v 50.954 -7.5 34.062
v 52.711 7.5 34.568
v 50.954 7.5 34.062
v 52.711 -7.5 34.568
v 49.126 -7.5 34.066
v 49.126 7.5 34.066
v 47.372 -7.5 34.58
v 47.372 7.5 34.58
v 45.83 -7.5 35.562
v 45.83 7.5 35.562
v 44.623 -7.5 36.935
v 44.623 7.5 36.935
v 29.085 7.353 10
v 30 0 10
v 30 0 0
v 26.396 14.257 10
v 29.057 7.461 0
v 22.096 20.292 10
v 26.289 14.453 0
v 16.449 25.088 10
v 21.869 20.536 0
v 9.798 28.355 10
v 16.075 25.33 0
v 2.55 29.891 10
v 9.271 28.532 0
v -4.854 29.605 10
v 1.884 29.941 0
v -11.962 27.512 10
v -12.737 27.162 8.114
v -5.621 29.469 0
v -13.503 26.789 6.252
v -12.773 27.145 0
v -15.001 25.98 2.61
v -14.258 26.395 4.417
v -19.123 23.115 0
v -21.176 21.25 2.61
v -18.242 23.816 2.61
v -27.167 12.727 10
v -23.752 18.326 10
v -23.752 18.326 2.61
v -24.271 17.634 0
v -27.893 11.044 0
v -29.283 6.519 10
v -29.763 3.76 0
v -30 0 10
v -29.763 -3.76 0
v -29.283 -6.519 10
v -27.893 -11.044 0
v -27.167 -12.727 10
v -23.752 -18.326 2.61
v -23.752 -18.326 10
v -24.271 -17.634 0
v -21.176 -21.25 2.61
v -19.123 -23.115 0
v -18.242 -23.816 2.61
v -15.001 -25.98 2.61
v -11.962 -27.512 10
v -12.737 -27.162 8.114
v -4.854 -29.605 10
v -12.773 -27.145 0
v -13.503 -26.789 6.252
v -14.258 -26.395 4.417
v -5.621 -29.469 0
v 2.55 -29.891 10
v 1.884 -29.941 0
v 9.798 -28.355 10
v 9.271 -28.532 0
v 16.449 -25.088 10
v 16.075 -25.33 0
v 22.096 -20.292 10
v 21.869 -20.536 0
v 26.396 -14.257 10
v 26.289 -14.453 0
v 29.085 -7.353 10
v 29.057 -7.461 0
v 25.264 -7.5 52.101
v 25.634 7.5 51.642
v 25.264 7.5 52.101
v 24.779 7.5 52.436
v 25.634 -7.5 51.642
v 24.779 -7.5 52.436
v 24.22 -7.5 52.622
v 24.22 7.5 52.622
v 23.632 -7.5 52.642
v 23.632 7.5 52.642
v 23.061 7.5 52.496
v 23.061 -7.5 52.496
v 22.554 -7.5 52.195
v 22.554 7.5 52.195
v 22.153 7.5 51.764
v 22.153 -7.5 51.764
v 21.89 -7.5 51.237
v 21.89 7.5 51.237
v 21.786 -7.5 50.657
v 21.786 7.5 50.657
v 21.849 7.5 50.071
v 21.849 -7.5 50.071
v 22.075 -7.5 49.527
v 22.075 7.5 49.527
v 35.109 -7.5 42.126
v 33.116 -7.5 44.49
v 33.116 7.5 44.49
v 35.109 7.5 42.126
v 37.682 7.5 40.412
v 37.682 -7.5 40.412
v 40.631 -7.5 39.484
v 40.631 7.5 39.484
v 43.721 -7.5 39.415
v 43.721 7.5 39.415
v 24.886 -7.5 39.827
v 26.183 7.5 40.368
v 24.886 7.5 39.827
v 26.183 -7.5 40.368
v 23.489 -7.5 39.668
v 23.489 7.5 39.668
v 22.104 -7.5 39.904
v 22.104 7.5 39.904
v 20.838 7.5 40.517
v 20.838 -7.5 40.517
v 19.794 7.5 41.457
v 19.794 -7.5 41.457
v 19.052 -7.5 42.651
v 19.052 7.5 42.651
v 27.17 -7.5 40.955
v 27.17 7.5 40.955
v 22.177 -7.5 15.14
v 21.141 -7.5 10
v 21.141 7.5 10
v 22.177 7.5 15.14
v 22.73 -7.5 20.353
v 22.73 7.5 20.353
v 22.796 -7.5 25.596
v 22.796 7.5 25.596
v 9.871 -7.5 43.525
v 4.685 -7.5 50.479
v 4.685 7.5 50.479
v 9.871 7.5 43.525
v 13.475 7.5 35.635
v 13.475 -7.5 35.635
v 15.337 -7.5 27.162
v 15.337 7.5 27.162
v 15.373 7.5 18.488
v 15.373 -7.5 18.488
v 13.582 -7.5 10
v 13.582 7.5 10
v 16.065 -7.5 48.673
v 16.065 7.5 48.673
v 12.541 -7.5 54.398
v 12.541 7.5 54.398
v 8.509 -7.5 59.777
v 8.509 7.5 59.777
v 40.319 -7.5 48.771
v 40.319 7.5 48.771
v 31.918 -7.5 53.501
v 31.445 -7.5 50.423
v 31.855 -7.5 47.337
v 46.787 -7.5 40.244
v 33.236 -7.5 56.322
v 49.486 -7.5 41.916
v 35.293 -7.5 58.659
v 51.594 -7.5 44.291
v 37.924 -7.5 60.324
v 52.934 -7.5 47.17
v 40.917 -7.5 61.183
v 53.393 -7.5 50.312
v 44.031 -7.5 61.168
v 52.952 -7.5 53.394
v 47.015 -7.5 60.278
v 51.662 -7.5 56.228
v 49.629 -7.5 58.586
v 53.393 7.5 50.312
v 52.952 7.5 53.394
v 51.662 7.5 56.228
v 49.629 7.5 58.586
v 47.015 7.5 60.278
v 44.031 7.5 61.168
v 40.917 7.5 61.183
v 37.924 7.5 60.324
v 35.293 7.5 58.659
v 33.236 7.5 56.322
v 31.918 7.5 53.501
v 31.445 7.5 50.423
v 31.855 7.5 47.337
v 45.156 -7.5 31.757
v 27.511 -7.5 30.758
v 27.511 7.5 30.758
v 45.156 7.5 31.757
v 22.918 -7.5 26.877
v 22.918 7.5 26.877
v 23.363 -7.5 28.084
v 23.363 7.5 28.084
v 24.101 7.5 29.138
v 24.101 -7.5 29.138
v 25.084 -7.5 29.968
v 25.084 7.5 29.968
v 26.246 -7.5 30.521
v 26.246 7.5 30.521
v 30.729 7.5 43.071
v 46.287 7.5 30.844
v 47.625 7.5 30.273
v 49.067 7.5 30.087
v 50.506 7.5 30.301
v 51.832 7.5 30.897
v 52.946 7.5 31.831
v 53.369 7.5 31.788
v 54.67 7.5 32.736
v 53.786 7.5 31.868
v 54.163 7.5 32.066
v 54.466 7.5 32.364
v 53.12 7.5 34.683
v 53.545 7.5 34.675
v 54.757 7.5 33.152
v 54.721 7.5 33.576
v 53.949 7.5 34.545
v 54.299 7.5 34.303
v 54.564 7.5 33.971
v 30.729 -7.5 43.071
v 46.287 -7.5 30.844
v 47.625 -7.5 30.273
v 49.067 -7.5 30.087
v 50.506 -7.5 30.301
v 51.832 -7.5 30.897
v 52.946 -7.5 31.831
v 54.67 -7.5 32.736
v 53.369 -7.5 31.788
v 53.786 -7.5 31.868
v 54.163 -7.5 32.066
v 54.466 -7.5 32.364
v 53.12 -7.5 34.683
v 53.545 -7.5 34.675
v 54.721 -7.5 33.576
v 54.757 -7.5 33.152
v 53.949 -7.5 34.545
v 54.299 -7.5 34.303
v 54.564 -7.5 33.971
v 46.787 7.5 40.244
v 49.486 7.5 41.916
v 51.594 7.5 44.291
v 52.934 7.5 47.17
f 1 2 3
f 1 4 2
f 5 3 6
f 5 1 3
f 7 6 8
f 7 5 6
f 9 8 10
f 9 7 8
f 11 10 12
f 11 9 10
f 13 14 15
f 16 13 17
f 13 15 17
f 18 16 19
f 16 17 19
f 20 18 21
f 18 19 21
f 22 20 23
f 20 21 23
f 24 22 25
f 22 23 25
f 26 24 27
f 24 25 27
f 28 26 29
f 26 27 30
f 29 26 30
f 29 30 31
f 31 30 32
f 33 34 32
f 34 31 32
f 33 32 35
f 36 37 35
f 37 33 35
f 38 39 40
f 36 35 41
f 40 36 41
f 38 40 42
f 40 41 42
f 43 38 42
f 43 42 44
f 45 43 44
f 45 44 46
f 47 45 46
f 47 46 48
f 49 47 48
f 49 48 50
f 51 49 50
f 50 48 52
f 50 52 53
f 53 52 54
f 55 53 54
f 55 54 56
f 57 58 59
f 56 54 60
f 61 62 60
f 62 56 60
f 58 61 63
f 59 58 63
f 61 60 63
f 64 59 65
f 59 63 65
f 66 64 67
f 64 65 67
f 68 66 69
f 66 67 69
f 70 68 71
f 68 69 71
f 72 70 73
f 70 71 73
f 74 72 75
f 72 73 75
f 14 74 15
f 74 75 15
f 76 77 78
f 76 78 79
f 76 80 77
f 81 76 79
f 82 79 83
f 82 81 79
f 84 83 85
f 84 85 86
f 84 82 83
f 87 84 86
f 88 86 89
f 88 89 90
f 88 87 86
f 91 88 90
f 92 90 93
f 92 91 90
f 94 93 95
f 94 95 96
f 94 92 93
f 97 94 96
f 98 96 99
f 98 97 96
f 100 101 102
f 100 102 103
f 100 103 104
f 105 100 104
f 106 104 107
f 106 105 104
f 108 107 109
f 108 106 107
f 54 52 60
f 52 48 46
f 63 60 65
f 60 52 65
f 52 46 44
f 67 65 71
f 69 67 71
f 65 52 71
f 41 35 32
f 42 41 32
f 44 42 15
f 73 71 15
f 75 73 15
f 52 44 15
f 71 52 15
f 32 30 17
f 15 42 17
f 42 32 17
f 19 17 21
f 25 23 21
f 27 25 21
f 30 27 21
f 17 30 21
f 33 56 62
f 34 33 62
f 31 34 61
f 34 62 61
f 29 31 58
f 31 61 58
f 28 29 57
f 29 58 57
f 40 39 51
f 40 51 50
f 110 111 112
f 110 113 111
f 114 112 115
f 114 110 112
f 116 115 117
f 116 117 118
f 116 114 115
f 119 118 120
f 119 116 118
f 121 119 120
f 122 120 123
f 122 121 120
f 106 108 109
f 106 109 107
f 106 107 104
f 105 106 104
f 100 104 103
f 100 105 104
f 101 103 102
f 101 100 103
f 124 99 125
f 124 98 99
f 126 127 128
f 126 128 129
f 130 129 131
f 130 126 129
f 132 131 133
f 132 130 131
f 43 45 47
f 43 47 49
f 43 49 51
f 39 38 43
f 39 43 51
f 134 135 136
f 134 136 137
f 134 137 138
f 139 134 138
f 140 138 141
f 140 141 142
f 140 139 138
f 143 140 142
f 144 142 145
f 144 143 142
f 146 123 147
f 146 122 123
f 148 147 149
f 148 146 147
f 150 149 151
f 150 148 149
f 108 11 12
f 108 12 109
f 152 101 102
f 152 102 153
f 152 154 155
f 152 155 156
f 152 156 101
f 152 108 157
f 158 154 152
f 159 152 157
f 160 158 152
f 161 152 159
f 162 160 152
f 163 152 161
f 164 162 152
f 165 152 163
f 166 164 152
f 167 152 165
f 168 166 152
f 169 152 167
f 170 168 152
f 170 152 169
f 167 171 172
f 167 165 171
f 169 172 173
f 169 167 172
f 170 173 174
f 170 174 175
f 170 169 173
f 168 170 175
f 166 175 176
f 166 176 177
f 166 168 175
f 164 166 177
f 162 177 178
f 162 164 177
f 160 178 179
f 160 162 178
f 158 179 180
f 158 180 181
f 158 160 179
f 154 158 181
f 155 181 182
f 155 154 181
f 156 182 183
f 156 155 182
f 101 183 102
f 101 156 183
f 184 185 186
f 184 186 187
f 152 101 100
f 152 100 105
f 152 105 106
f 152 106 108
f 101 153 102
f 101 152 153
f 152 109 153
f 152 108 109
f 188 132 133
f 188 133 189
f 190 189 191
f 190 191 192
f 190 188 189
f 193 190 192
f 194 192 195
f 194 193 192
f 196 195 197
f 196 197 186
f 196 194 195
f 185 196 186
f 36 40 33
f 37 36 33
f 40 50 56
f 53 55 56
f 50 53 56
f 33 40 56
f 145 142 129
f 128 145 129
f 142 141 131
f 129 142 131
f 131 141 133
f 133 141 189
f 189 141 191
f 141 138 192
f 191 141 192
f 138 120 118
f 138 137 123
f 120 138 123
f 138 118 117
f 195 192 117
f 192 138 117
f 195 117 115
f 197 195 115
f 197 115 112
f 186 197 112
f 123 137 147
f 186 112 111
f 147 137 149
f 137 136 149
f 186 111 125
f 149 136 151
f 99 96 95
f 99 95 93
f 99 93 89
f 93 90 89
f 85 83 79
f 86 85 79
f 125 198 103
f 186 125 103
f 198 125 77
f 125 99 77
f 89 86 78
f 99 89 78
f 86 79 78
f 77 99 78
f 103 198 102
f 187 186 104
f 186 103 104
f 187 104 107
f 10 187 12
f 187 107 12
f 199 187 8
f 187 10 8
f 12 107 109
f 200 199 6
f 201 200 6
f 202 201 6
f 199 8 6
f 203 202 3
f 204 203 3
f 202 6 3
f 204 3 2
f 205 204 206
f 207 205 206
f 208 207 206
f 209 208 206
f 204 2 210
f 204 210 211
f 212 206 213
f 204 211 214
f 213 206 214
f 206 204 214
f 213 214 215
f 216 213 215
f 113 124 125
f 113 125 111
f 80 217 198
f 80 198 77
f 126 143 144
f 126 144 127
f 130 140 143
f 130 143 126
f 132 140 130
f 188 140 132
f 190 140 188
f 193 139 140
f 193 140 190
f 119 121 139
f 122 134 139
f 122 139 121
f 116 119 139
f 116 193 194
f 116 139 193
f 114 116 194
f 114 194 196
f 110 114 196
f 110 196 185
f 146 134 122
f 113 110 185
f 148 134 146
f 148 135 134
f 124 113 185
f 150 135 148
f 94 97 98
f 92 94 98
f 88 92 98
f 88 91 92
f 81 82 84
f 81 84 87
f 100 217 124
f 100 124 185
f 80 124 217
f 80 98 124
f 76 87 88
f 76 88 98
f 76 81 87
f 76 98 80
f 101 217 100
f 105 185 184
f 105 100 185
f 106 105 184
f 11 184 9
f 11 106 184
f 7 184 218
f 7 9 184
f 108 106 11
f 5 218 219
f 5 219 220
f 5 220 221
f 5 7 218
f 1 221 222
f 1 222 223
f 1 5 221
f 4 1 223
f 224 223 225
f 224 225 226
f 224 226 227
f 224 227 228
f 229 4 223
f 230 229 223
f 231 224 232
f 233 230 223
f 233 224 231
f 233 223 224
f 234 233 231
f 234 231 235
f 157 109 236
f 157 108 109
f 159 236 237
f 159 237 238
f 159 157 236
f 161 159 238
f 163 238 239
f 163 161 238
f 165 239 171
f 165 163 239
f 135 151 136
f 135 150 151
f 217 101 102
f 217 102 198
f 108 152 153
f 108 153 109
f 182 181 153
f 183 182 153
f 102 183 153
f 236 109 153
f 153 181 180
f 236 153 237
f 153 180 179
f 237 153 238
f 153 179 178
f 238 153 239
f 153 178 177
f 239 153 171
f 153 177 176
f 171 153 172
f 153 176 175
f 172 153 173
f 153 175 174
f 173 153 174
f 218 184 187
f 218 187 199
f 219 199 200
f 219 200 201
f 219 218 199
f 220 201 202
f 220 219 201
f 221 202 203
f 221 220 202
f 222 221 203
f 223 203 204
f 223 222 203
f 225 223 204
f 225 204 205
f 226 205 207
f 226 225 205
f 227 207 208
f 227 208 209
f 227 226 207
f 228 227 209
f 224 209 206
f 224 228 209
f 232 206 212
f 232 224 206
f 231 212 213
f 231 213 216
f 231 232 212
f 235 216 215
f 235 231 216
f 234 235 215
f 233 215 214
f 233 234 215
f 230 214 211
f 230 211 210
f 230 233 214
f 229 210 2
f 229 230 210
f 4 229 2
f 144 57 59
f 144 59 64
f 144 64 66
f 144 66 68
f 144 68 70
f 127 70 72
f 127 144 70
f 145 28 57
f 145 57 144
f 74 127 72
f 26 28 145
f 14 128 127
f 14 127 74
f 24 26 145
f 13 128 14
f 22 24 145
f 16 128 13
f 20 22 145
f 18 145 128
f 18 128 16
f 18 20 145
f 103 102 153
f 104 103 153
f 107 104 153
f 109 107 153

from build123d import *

# Parameters (mm, degrees)
F0_R      = 30
F1_DEPTH  = 10
F3_DEPTH  = 36.6
F4_DEPTH  = 7.5
F5_DEPTH  = 7.5
F6_DEPTH  = 7.5
F7_DEPTH  = 7.5
F8_DEPTH  = 7.5
F9_DEPTH  = 7.5
F10_DEPTH = 7.5


with BuildPart() as f1:
    # F0 (on Top) → F1 (new body)
    with BuildSketch(Plane.XY):
        Circle(F0_R)
    extrude(amount=F1_DEPTH)

    # F2 (on Front) → F3 (cut, symmetric)
    with BuildSketch(Plane.XZ):
        Polygon((-23.752017, 2.609918), (-15.000855, 2.609918), (-11.70979, 10.612488), (-23.752017, 10.612488), align=None)
    extrude(amount=F3_DEPTH, both=True, mode=Mode.SUBTRACT)

    # F2 (on Front) → F4 (join, symmetric)
    with BuildSketch(Plane.XZ):
        with BuildLine():
            Line((8.509134, 59.776919), (4.685482, 50.479309))
            ThreePointArc((4.685482, 50.479309), (14.632215, 31.443401), (13.578704, 9.991281))
            Line((13.578704, 9.991281), (21.138772, 9.991281))
            ThreePointArc((21.138772, 9.991281), (22.513844, 17.735509), (22.796076, 25.595804))
            ThreePointArc((22.796076, 25.595804), (24.101227, 29.137781), (27.510648, 30.757927))
            Line((27.510648, 30.757927), (45.155515, 31.756574))
            Line((45.155515, 31.756574), (46.479001, 31.831479))
            Line((46.479001, 31.831479), (44.623066, 36.935325))
            Line((44.623066, 36.935325), (43.721419, 39.414866))
            ThreePointArc((43.721419, 39.414866), (37.681727, 40.412232), (33.11581, 44.489611))
            Line((33.11581, 44.489611), (30.728899, 43.070735))
            Line((30.728899, 43.070735), (27.170425, 40.955436))
            Line((27.170425, 40.955436), (26.182877, 40.368398))
            ThreePointArc((26.182877, 40.368398), (22.103598, 39.904413), (19.052114, 42.651091))
            ThreePointArc((19.052114, 42.651091), (14.36798, 51.575592), (8.509134, 59.776919))
        make_face()
    extrude(amount=F4_DEPTH, both=True)

    # F2 (on Front) → F7 (join, symmetric)
    with BuildSketch(Plane.XZ):
        Polygon((22.075249, 49.526824), (27.170425, 40.955436), (30.728899, 43.070735), (25.633722, 51.642123), align=None)
    extrude(amount=F7_DEPTH, both=True)

    # F2 (on Front) → F8 (join, symmetric)
    with BuildSketch(Plane.XZ):
        with BuildLine():
            ThreePointArc((25.633722, 51.642123), (22.796836, 52.36371), (22.075249, 49.526824))
            Line((22.075249, 49.526824), (25.633722, 51.642123))
        make_face()
    extrude(amount=F8_DEPTH, both=True)

    # F2 (on Front) → F9 (join, symmetric)
    with BuildSketch(Plane.XZ):
        with BuildLine():
            Line((46.479001, 31.831479), (45.155515, 31.756574))
            ThreePointArc((45.155515, 31.756574), (49.067291, 30.087217), (52.946247, 31.831479))
            Line((52.946247, 31.831479), (52.710793, 34.568003))
            ThreePointArc((52.710793, 34.568003), (48.230587, 34.260941), (44.623066, 36.935325))
            Line((44.623066, 36.935325), (46.479001, 31.831479))
        make_face()
    extrude(amount=F9_DEPTH, both=True)

    # F2 (on Front) → F10 (join, symmetric)
    with BuildSketch(Plane.XZ):
        with BuildLine():
            Line((52.710793, 34.568003), (52.946247, 31.831479))
            ThreePointArc((52.946247, 31.831479), (54.754823, 33.365482), (52.710793, 34.568003))
        make_face()
    extrude(amount=F10_DEPTH, both=True)


with BuildPart() as f5:
    # F2 (on Front) → F5 (new body, symmetric)
    with BuildSketch(Plane.XZ):
        with BuildLine():
            ThreePointArc((53.393428, 50.311983), (39.389906, 60.860464), (33.11581, 44.489611))
            Line((33.11581, 44.489611), (40.319025, 48.771491))
            Line((40.319025, 48.771491), (43.721419, 39.414866))
            ThreePointArc((43.721419, 39.414866), (50.626672, 43.026811), (53.393428, 50.311983))
        make_face()
    extrude(amount=F5_DEPTH, both=True)


with BuildPart() as f6:
    # F2 (on Front) → F6 (new body, symmetric)
    with BuildSketch(Plane.XZ):
        with BuildLine():
            Line((40.319025, 48.771491), (33.11581, 44.489611))
            ThreePointArc((33.11581, 44.489611), (37.681727, 40.412232), (43.721419, 39.414866))
            Line((43.721419, 39.414866), (40.319025, 48.771491))
        make_face()
    extrude(amount=F6_DEPTH, both=True)


solid = Compound([f1.part, f5.part, f6.part])
